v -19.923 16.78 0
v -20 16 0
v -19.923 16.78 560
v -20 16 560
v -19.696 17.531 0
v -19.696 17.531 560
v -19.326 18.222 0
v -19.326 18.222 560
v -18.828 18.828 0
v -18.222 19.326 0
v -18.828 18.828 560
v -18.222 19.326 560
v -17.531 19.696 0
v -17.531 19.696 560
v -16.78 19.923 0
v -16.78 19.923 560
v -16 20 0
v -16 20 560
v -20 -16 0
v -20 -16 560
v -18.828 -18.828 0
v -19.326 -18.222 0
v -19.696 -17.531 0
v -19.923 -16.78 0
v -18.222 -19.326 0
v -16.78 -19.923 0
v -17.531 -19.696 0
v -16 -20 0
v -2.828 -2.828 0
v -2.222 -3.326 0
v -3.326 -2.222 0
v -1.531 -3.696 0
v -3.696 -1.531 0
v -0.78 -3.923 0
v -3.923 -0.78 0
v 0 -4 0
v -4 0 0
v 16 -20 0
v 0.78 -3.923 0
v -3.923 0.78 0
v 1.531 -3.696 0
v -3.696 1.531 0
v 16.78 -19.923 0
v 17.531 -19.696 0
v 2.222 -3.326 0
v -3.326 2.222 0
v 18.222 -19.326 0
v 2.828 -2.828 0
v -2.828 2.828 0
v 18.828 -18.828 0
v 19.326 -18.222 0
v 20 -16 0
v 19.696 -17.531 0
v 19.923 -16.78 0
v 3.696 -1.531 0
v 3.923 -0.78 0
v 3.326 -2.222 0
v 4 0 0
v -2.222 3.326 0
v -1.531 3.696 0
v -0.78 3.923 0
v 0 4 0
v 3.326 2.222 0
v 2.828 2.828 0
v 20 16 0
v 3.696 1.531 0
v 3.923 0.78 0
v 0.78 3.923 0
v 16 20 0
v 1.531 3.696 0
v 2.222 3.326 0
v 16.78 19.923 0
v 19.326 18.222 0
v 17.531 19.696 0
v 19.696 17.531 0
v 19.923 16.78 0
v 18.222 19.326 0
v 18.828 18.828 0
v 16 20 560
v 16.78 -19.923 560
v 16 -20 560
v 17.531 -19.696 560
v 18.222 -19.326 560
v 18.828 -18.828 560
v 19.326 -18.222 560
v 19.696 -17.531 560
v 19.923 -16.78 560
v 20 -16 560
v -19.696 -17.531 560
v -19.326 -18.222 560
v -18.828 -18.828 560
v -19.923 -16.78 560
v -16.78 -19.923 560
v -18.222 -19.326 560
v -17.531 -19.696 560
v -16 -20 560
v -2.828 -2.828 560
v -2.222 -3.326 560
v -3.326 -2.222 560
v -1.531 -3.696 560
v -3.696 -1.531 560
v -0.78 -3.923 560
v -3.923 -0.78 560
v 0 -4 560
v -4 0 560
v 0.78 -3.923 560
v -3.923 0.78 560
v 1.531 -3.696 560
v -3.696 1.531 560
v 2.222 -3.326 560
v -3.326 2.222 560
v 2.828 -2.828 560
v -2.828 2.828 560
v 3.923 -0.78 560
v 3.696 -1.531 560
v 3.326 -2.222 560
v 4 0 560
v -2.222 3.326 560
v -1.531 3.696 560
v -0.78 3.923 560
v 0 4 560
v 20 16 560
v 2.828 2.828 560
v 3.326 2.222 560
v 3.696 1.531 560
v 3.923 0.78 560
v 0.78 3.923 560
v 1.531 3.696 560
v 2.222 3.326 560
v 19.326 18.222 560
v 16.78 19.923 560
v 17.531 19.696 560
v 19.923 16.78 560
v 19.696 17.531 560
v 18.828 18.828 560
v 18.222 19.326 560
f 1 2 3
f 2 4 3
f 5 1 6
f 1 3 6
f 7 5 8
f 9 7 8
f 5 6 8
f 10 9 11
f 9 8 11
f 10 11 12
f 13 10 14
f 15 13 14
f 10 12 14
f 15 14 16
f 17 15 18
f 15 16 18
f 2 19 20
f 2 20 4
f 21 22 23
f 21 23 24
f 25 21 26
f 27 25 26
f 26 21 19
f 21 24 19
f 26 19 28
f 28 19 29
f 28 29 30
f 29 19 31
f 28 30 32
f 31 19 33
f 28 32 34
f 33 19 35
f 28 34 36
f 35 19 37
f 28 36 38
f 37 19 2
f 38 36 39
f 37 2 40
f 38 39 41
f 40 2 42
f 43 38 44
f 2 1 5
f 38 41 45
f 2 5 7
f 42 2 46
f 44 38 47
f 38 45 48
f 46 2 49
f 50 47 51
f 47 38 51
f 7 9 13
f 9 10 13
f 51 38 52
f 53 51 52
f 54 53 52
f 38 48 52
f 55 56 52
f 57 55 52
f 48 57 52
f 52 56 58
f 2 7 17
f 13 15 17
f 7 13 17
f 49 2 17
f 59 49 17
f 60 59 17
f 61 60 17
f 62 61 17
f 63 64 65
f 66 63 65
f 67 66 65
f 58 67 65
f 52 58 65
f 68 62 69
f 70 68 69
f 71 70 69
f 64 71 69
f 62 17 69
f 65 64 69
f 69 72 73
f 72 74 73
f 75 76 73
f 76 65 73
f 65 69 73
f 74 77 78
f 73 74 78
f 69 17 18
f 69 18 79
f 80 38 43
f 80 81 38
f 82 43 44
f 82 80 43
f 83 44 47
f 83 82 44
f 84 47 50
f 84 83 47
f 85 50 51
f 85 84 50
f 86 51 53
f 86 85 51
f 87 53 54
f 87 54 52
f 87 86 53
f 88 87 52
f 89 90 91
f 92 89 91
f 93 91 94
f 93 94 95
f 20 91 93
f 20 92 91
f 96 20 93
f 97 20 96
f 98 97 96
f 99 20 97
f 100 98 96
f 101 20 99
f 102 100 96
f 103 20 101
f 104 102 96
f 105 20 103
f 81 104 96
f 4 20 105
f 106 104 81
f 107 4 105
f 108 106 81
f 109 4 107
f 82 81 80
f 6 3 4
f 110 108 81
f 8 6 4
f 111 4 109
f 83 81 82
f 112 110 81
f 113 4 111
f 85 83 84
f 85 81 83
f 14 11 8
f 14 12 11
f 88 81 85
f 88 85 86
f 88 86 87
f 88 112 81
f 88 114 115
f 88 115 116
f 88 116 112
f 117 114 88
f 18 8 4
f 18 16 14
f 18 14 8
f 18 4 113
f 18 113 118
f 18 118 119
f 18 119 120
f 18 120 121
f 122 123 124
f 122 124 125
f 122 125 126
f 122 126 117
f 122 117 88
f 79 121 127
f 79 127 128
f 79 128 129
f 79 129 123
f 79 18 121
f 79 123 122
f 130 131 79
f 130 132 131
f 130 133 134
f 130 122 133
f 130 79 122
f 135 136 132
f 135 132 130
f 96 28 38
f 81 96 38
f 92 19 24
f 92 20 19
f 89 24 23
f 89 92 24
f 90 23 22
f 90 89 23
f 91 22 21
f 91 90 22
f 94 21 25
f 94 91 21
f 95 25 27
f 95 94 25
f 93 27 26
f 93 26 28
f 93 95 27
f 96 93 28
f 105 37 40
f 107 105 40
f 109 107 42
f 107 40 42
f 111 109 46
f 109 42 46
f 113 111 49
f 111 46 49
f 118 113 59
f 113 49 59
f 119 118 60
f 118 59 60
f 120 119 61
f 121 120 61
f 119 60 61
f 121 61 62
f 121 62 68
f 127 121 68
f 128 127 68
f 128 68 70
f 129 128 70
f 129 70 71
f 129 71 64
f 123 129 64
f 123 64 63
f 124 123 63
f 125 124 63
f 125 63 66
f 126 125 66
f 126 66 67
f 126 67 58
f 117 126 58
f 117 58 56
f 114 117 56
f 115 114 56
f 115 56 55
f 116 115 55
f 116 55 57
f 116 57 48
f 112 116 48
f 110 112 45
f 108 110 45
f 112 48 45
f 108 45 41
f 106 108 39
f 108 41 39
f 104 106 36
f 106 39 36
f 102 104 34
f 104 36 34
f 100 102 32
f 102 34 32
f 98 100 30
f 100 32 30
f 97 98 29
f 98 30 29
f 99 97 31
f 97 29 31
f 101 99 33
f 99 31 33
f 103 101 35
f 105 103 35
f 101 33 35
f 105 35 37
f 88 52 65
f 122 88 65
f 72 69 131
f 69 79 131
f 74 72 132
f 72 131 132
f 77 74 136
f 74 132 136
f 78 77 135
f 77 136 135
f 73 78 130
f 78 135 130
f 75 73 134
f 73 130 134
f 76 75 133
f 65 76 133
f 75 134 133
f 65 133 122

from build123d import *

# Parameters (mm, degrees)
F0_W     = 40
F0_H     = 40
F1_DEPTH = 560
F3_D     = 8
F4_R     = 4


with BuildPart() as f1:
    # F0 (on Top) → F1 (new body)
    with BuildSketch(Plane.XY):
        Rectangle(F0_W, F0_H)
    extrude(amount=F1_DEPTH)

    # F3 (through all)
    with Locations(Plane.XY.offset(560)):
        with Locations((0, 0)):
            Hole(F3_D / 2)

    # F4
    f4_edges = [f1.edges().sort_by_distance(p)[0] for p in [
        (20, -20, 280),
        (-20, -20, 280),
        (20, 20, 280),
        (-20, 20, 280),
    ]]
    fillet(f4_edges, radius=F4_R)


solid = f1.part
